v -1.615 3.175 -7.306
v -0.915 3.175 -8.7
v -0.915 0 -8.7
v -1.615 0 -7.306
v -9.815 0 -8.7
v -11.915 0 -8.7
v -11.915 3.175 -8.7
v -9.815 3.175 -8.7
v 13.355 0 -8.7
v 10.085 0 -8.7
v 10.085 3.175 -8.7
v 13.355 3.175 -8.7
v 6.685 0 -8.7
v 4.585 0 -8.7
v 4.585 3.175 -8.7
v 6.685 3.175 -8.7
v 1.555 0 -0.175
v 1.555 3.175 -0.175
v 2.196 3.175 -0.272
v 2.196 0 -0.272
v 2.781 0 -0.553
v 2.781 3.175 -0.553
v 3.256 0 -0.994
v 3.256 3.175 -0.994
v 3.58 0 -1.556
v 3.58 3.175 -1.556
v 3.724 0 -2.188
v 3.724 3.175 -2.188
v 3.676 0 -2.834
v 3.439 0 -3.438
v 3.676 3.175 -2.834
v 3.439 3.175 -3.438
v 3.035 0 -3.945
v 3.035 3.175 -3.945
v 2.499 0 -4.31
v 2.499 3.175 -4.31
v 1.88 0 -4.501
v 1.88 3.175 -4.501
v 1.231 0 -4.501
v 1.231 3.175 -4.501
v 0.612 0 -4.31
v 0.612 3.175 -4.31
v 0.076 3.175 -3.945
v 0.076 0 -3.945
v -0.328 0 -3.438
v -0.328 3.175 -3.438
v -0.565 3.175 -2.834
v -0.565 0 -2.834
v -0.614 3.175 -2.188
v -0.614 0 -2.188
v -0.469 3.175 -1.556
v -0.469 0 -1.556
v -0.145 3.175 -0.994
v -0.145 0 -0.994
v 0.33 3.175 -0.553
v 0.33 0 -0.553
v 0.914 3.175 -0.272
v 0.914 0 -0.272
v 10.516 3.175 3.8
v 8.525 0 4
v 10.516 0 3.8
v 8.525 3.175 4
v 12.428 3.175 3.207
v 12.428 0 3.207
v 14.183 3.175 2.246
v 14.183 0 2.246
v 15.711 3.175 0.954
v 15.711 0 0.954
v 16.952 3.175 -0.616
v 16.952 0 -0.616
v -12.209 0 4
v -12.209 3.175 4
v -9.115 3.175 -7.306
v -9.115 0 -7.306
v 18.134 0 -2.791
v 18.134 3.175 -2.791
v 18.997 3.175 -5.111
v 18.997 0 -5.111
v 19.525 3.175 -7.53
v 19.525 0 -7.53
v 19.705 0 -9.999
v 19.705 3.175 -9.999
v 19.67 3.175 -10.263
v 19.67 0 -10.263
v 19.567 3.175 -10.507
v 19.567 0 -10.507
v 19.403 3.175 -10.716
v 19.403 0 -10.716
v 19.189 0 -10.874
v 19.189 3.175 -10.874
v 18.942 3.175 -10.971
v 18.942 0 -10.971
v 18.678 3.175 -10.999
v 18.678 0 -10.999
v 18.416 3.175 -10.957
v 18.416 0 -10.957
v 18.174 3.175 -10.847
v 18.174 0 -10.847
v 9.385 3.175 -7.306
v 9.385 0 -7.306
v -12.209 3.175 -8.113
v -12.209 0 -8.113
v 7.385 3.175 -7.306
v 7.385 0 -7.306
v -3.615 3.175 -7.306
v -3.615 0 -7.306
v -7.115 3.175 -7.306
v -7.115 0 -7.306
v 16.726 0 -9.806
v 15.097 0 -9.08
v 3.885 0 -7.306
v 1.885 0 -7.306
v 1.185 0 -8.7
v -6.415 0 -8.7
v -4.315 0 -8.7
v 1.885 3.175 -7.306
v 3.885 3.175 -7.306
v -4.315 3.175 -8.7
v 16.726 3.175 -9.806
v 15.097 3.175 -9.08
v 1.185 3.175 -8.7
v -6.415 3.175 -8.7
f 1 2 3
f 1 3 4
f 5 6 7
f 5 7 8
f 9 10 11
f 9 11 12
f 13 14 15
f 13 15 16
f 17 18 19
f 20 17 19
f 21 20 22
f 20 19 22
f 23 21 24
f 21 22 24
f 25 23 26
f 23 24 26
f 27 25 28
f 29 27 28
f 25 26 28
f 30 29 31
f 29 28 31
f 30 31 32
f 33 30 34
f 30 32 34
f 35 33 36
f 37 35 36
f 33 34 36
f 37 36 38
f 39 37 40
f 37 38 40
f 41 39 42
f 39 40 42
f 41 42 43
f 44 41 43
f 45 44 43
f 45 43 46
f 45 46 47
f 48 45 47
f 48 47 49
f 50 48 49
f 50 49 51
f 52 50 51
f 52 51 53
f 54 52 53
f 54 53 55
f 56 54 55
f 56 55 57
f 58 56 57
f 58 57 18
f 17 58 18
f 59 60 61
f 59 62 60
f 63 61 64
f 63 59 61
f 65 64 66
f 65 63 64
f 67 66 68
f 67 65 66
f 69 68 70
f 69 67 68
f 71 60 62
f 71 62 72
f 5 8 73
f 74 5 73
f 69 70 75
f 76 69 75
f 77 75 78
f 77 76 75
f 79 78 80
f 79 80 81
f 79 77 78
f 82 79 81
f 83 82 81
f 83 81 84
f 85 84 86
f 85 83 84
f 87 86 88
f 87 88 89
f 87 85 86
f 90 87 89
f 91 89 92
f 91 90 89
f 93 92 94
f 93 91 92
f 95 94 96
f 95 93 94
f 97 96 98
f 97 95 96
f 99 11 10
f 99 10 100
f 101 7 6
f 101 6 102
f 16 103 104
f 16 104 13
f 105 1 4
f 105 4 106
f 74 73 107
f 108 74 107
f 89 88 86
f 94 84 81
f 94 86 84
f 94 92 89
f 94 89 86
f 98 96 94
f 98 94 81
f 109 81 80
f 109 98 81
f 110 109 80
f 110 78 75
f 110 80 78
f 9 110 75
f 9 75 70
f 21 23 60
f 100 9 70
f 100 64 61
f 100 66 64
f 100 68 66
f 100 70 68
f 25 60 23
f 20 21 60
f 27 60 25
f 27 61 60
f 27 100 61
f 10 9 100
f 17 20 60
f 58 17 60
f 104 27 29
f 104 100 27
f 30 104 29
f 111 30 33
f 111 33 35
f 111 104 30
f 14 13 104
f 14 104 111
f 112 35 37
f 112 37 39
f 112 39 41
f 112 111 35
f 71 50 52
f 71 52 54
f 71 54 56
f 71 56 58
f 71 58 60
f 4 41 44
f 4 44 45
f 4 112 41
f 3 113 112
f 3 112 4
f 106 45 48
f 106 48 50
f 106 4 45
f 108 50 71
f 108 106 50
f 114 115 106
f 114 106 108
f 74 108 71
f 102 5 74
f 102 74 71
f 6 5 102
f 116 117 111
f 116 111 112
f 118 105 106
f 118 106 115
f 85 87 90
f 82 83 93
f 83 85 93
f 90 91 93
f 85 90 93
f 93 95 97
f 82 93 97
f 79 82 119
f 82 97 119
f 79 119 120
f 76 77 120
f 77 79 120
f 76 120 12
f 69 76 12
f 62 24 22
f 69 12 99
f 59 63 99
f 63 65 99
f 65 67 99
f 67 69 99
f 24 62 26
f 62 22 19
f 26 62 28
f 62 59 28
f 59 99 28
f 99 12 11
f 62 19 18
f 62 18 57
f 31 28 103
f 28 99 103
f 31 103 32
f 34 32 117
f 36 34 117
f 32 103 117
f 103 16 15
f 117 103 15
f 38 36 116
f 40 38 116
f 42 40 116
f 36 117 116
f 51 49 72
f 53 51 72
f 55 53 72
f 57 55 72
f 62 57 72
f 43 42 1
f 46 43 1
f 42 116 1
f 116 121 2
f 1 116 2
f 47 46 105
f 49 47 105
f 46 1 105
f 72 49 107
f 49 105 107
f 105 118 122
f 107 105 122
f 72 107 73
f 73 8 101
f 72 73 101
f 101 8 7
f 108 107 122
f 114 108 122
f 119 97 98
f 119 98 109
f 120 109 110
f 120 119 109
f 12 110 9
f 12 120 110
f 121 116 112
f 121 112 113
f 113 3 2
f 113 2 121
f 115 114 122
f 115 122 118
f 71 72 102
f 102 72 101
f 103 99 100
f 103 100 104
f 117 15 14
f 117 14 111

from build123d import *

# Parameters (mm, degrees)
BOSS_EXTRUDE1_DEPTH = 3.175
SKETCH2_R           = 2.175
CUT_EXTRUDE2_DEPTH  = 6.35
BOSS_EXTRUDE2_DEPTH = 3.175
CUT_EXTRUDE3_DEPTH  = 10
FILLET1_R           = 10
CUT_EXTRUDE4_DEPTH  = 10
SKETCH6_W           = 56.98519
SKETCH6_H           = 25.4
CUT_EXTRUDE5_DEPTH  = 71.135360158


with BuildPart() as part:
    # Sketch1 → Boss-Extrude1 (new body)
    with BuildSketch(Plane(origin=(0, 0, 0), x_dir=(1, 0, 0), z_dir=(0, 1, 0))):
        with BuildLine():
            Line((-62.844661922, 8.700177936), (13.355338078, 8.700177936))
            ThreePointArc((13.355338078, 8.700177936), (19.705338078, 2.350177936), (13.355338078, -3.999822064))
            Line((13.355338078, -3.999822064), (-62.844661922, -3.999822064))
            ThreePointArc((-62.844661922, -3.999822064), (-69.194661922, 2.350177936), (-62.844661922, 8.700177936))
        make_face()
    extrude(amount=BOSS_EXTRUDE1_DEPTH)

    # Sketch2 → Cut-Extrude2 (cut)
    with BuildSketch(Plane(origin=(0, 3.175, 0), x_dir=(1, 0, 0), z_dir=(0, 1, 0))):
        with Locations(Location((-62.844661922, 2.350177936, 0), (0, 0, 270))):
            Circle(SKETCH2_R)
        with Locations(Location((-31.094661922, 2.350177936, 0), (0, 0, 270))):
            Circle(SKETCH2_R)
        with Locations(Location((1.555338078, 2.350177936, 0), (0, 0, 270))):
            Circle(SKETCH2_R)
    extrude(amount=-CUT_EXTRUDE2_DEPTH, mode=Mode.SUBTRACT)

    # Sketch3 → Boss-Extrude2 (add)
    with BuildSketch(Plane(origin=(0, 3.175, 0), x_dir=(1, 0, 0), z_dir=(0, 1, 0))):
        with BuildLine():
            Line((13.355338078, 8.700177936), (13.355338078, 2.350177936))
            Line((13.355338078, 2.350177936), (19.705338078, 2.350177936))
            Line((19.705338078, 2.350177936), (19.705338078, 9.999403669))
            ThreePointArc((19.705338078, 9.999403669), (19.189460997, 10.874403669), (18.174088078, 10.846618776))
            ThreePointArc((18.174088078, 10.846618776), (15.930319915, 9.401611756), (13.355338078, 8.700177936))
        make_face()
    extrude(amount=-BOSS_EXTRUDE2_DEPTH)

    # Sketch4 → Cut-Extrude3 (cut)
    with BuildSketch(Plane(origin=(0, 3.175, 0), x_dir=(1, 0, 0), z_dir=(0, 1, 0))):
        with BuildLine():
            Line((19.705338078, 9.999403669), (19.705338078, -6.000596331))
            Line((19.705338078, -6.000596331), (9.205338078, -6.000596331))
            ThreePointArc((9.205338078, -6.000596331), (16.836220051, 0.436949875), (19.705338078, 9.999403669))
        make_face()
    extrude(amount=-CUT_EXTRUDE3_DEPTH, mode=Mode.SUBTRACT)

    # Fillet1
    fillet1_edges = [part.edges().sort_by_distance(p)[0] for p in [
        (12.654174153, 1.5875, 3.999822064),
    ]]
    fillet(fillet1_edges, radius=FILLET1_R)

    # Sketch5 → Cut-Extrude4 (cut)
    with BuildSketch(Plane(origin=(0, 3.175, 0), x_dir=(1, 0, 0), z_dir=(0, 1, 0))):
        Polygon((-4.314661922, 8.700177936), (-0.914661922, 8.700177936), (-1.614661922, 7.306047383), (-3.614661922, 7.306047383), align=None)
        Polygon((-9.814661922, 8.700177936), (-9.114661922, 7.306047383), (-7.114661922, 7.306047383), (-6.414661922, 8.700177936), align=None)
        Polygon((1.185338078, 8.700177936), (4.585338078, 8.700177936), (3.885338078, 7.306047383), (1.885338078, 7.306047383), align=None)
        Polygon((6.685338078, 8.700177936), (10.085338078, 8.700177936), (9.385338078, 7.306047383), (7.385338078, 7.306047383), align=None)
        Polygon((-15.314661922, 8.700177936), (-11.914661922, 8.700177936), (-12.614661922, 7.306047383), (-14.614661922, 7.306047383), align=None)
        Polygon((-20.814661922, 8.700177936), (-17.414661922, 8.700177936), (-18.114661922, 7.306047383), (-20.114661922, 7.306047383), align=None)
        Polygon((-26.314661922, 8.700177936), (-22.914661922, 8.700177936), (-23.614661922, 7.306047383), (-25.614661922, 7.306047383), align=None)
    extrude(amount=-CUT_EXTRUDE4_DEPTH, mode=Mode.SUBTRACT)

    # Sketch6 → Cut-Extrude5 (cut, through all)
    with BuildSketch(Plane(origin=(0, 3.175, 0), x_dir=(1, 0, 0), z_dir=(0, 1, 0))):
        with Locations((-40.702066922, 2.350177936)):
            Rectangle(SKETCH6_W, SKETCH6_H)
    extrude(amount=-CUT_EXTRUDE5_DEPTH, mode=Mode.SUBTRACT)


solid = part.part
